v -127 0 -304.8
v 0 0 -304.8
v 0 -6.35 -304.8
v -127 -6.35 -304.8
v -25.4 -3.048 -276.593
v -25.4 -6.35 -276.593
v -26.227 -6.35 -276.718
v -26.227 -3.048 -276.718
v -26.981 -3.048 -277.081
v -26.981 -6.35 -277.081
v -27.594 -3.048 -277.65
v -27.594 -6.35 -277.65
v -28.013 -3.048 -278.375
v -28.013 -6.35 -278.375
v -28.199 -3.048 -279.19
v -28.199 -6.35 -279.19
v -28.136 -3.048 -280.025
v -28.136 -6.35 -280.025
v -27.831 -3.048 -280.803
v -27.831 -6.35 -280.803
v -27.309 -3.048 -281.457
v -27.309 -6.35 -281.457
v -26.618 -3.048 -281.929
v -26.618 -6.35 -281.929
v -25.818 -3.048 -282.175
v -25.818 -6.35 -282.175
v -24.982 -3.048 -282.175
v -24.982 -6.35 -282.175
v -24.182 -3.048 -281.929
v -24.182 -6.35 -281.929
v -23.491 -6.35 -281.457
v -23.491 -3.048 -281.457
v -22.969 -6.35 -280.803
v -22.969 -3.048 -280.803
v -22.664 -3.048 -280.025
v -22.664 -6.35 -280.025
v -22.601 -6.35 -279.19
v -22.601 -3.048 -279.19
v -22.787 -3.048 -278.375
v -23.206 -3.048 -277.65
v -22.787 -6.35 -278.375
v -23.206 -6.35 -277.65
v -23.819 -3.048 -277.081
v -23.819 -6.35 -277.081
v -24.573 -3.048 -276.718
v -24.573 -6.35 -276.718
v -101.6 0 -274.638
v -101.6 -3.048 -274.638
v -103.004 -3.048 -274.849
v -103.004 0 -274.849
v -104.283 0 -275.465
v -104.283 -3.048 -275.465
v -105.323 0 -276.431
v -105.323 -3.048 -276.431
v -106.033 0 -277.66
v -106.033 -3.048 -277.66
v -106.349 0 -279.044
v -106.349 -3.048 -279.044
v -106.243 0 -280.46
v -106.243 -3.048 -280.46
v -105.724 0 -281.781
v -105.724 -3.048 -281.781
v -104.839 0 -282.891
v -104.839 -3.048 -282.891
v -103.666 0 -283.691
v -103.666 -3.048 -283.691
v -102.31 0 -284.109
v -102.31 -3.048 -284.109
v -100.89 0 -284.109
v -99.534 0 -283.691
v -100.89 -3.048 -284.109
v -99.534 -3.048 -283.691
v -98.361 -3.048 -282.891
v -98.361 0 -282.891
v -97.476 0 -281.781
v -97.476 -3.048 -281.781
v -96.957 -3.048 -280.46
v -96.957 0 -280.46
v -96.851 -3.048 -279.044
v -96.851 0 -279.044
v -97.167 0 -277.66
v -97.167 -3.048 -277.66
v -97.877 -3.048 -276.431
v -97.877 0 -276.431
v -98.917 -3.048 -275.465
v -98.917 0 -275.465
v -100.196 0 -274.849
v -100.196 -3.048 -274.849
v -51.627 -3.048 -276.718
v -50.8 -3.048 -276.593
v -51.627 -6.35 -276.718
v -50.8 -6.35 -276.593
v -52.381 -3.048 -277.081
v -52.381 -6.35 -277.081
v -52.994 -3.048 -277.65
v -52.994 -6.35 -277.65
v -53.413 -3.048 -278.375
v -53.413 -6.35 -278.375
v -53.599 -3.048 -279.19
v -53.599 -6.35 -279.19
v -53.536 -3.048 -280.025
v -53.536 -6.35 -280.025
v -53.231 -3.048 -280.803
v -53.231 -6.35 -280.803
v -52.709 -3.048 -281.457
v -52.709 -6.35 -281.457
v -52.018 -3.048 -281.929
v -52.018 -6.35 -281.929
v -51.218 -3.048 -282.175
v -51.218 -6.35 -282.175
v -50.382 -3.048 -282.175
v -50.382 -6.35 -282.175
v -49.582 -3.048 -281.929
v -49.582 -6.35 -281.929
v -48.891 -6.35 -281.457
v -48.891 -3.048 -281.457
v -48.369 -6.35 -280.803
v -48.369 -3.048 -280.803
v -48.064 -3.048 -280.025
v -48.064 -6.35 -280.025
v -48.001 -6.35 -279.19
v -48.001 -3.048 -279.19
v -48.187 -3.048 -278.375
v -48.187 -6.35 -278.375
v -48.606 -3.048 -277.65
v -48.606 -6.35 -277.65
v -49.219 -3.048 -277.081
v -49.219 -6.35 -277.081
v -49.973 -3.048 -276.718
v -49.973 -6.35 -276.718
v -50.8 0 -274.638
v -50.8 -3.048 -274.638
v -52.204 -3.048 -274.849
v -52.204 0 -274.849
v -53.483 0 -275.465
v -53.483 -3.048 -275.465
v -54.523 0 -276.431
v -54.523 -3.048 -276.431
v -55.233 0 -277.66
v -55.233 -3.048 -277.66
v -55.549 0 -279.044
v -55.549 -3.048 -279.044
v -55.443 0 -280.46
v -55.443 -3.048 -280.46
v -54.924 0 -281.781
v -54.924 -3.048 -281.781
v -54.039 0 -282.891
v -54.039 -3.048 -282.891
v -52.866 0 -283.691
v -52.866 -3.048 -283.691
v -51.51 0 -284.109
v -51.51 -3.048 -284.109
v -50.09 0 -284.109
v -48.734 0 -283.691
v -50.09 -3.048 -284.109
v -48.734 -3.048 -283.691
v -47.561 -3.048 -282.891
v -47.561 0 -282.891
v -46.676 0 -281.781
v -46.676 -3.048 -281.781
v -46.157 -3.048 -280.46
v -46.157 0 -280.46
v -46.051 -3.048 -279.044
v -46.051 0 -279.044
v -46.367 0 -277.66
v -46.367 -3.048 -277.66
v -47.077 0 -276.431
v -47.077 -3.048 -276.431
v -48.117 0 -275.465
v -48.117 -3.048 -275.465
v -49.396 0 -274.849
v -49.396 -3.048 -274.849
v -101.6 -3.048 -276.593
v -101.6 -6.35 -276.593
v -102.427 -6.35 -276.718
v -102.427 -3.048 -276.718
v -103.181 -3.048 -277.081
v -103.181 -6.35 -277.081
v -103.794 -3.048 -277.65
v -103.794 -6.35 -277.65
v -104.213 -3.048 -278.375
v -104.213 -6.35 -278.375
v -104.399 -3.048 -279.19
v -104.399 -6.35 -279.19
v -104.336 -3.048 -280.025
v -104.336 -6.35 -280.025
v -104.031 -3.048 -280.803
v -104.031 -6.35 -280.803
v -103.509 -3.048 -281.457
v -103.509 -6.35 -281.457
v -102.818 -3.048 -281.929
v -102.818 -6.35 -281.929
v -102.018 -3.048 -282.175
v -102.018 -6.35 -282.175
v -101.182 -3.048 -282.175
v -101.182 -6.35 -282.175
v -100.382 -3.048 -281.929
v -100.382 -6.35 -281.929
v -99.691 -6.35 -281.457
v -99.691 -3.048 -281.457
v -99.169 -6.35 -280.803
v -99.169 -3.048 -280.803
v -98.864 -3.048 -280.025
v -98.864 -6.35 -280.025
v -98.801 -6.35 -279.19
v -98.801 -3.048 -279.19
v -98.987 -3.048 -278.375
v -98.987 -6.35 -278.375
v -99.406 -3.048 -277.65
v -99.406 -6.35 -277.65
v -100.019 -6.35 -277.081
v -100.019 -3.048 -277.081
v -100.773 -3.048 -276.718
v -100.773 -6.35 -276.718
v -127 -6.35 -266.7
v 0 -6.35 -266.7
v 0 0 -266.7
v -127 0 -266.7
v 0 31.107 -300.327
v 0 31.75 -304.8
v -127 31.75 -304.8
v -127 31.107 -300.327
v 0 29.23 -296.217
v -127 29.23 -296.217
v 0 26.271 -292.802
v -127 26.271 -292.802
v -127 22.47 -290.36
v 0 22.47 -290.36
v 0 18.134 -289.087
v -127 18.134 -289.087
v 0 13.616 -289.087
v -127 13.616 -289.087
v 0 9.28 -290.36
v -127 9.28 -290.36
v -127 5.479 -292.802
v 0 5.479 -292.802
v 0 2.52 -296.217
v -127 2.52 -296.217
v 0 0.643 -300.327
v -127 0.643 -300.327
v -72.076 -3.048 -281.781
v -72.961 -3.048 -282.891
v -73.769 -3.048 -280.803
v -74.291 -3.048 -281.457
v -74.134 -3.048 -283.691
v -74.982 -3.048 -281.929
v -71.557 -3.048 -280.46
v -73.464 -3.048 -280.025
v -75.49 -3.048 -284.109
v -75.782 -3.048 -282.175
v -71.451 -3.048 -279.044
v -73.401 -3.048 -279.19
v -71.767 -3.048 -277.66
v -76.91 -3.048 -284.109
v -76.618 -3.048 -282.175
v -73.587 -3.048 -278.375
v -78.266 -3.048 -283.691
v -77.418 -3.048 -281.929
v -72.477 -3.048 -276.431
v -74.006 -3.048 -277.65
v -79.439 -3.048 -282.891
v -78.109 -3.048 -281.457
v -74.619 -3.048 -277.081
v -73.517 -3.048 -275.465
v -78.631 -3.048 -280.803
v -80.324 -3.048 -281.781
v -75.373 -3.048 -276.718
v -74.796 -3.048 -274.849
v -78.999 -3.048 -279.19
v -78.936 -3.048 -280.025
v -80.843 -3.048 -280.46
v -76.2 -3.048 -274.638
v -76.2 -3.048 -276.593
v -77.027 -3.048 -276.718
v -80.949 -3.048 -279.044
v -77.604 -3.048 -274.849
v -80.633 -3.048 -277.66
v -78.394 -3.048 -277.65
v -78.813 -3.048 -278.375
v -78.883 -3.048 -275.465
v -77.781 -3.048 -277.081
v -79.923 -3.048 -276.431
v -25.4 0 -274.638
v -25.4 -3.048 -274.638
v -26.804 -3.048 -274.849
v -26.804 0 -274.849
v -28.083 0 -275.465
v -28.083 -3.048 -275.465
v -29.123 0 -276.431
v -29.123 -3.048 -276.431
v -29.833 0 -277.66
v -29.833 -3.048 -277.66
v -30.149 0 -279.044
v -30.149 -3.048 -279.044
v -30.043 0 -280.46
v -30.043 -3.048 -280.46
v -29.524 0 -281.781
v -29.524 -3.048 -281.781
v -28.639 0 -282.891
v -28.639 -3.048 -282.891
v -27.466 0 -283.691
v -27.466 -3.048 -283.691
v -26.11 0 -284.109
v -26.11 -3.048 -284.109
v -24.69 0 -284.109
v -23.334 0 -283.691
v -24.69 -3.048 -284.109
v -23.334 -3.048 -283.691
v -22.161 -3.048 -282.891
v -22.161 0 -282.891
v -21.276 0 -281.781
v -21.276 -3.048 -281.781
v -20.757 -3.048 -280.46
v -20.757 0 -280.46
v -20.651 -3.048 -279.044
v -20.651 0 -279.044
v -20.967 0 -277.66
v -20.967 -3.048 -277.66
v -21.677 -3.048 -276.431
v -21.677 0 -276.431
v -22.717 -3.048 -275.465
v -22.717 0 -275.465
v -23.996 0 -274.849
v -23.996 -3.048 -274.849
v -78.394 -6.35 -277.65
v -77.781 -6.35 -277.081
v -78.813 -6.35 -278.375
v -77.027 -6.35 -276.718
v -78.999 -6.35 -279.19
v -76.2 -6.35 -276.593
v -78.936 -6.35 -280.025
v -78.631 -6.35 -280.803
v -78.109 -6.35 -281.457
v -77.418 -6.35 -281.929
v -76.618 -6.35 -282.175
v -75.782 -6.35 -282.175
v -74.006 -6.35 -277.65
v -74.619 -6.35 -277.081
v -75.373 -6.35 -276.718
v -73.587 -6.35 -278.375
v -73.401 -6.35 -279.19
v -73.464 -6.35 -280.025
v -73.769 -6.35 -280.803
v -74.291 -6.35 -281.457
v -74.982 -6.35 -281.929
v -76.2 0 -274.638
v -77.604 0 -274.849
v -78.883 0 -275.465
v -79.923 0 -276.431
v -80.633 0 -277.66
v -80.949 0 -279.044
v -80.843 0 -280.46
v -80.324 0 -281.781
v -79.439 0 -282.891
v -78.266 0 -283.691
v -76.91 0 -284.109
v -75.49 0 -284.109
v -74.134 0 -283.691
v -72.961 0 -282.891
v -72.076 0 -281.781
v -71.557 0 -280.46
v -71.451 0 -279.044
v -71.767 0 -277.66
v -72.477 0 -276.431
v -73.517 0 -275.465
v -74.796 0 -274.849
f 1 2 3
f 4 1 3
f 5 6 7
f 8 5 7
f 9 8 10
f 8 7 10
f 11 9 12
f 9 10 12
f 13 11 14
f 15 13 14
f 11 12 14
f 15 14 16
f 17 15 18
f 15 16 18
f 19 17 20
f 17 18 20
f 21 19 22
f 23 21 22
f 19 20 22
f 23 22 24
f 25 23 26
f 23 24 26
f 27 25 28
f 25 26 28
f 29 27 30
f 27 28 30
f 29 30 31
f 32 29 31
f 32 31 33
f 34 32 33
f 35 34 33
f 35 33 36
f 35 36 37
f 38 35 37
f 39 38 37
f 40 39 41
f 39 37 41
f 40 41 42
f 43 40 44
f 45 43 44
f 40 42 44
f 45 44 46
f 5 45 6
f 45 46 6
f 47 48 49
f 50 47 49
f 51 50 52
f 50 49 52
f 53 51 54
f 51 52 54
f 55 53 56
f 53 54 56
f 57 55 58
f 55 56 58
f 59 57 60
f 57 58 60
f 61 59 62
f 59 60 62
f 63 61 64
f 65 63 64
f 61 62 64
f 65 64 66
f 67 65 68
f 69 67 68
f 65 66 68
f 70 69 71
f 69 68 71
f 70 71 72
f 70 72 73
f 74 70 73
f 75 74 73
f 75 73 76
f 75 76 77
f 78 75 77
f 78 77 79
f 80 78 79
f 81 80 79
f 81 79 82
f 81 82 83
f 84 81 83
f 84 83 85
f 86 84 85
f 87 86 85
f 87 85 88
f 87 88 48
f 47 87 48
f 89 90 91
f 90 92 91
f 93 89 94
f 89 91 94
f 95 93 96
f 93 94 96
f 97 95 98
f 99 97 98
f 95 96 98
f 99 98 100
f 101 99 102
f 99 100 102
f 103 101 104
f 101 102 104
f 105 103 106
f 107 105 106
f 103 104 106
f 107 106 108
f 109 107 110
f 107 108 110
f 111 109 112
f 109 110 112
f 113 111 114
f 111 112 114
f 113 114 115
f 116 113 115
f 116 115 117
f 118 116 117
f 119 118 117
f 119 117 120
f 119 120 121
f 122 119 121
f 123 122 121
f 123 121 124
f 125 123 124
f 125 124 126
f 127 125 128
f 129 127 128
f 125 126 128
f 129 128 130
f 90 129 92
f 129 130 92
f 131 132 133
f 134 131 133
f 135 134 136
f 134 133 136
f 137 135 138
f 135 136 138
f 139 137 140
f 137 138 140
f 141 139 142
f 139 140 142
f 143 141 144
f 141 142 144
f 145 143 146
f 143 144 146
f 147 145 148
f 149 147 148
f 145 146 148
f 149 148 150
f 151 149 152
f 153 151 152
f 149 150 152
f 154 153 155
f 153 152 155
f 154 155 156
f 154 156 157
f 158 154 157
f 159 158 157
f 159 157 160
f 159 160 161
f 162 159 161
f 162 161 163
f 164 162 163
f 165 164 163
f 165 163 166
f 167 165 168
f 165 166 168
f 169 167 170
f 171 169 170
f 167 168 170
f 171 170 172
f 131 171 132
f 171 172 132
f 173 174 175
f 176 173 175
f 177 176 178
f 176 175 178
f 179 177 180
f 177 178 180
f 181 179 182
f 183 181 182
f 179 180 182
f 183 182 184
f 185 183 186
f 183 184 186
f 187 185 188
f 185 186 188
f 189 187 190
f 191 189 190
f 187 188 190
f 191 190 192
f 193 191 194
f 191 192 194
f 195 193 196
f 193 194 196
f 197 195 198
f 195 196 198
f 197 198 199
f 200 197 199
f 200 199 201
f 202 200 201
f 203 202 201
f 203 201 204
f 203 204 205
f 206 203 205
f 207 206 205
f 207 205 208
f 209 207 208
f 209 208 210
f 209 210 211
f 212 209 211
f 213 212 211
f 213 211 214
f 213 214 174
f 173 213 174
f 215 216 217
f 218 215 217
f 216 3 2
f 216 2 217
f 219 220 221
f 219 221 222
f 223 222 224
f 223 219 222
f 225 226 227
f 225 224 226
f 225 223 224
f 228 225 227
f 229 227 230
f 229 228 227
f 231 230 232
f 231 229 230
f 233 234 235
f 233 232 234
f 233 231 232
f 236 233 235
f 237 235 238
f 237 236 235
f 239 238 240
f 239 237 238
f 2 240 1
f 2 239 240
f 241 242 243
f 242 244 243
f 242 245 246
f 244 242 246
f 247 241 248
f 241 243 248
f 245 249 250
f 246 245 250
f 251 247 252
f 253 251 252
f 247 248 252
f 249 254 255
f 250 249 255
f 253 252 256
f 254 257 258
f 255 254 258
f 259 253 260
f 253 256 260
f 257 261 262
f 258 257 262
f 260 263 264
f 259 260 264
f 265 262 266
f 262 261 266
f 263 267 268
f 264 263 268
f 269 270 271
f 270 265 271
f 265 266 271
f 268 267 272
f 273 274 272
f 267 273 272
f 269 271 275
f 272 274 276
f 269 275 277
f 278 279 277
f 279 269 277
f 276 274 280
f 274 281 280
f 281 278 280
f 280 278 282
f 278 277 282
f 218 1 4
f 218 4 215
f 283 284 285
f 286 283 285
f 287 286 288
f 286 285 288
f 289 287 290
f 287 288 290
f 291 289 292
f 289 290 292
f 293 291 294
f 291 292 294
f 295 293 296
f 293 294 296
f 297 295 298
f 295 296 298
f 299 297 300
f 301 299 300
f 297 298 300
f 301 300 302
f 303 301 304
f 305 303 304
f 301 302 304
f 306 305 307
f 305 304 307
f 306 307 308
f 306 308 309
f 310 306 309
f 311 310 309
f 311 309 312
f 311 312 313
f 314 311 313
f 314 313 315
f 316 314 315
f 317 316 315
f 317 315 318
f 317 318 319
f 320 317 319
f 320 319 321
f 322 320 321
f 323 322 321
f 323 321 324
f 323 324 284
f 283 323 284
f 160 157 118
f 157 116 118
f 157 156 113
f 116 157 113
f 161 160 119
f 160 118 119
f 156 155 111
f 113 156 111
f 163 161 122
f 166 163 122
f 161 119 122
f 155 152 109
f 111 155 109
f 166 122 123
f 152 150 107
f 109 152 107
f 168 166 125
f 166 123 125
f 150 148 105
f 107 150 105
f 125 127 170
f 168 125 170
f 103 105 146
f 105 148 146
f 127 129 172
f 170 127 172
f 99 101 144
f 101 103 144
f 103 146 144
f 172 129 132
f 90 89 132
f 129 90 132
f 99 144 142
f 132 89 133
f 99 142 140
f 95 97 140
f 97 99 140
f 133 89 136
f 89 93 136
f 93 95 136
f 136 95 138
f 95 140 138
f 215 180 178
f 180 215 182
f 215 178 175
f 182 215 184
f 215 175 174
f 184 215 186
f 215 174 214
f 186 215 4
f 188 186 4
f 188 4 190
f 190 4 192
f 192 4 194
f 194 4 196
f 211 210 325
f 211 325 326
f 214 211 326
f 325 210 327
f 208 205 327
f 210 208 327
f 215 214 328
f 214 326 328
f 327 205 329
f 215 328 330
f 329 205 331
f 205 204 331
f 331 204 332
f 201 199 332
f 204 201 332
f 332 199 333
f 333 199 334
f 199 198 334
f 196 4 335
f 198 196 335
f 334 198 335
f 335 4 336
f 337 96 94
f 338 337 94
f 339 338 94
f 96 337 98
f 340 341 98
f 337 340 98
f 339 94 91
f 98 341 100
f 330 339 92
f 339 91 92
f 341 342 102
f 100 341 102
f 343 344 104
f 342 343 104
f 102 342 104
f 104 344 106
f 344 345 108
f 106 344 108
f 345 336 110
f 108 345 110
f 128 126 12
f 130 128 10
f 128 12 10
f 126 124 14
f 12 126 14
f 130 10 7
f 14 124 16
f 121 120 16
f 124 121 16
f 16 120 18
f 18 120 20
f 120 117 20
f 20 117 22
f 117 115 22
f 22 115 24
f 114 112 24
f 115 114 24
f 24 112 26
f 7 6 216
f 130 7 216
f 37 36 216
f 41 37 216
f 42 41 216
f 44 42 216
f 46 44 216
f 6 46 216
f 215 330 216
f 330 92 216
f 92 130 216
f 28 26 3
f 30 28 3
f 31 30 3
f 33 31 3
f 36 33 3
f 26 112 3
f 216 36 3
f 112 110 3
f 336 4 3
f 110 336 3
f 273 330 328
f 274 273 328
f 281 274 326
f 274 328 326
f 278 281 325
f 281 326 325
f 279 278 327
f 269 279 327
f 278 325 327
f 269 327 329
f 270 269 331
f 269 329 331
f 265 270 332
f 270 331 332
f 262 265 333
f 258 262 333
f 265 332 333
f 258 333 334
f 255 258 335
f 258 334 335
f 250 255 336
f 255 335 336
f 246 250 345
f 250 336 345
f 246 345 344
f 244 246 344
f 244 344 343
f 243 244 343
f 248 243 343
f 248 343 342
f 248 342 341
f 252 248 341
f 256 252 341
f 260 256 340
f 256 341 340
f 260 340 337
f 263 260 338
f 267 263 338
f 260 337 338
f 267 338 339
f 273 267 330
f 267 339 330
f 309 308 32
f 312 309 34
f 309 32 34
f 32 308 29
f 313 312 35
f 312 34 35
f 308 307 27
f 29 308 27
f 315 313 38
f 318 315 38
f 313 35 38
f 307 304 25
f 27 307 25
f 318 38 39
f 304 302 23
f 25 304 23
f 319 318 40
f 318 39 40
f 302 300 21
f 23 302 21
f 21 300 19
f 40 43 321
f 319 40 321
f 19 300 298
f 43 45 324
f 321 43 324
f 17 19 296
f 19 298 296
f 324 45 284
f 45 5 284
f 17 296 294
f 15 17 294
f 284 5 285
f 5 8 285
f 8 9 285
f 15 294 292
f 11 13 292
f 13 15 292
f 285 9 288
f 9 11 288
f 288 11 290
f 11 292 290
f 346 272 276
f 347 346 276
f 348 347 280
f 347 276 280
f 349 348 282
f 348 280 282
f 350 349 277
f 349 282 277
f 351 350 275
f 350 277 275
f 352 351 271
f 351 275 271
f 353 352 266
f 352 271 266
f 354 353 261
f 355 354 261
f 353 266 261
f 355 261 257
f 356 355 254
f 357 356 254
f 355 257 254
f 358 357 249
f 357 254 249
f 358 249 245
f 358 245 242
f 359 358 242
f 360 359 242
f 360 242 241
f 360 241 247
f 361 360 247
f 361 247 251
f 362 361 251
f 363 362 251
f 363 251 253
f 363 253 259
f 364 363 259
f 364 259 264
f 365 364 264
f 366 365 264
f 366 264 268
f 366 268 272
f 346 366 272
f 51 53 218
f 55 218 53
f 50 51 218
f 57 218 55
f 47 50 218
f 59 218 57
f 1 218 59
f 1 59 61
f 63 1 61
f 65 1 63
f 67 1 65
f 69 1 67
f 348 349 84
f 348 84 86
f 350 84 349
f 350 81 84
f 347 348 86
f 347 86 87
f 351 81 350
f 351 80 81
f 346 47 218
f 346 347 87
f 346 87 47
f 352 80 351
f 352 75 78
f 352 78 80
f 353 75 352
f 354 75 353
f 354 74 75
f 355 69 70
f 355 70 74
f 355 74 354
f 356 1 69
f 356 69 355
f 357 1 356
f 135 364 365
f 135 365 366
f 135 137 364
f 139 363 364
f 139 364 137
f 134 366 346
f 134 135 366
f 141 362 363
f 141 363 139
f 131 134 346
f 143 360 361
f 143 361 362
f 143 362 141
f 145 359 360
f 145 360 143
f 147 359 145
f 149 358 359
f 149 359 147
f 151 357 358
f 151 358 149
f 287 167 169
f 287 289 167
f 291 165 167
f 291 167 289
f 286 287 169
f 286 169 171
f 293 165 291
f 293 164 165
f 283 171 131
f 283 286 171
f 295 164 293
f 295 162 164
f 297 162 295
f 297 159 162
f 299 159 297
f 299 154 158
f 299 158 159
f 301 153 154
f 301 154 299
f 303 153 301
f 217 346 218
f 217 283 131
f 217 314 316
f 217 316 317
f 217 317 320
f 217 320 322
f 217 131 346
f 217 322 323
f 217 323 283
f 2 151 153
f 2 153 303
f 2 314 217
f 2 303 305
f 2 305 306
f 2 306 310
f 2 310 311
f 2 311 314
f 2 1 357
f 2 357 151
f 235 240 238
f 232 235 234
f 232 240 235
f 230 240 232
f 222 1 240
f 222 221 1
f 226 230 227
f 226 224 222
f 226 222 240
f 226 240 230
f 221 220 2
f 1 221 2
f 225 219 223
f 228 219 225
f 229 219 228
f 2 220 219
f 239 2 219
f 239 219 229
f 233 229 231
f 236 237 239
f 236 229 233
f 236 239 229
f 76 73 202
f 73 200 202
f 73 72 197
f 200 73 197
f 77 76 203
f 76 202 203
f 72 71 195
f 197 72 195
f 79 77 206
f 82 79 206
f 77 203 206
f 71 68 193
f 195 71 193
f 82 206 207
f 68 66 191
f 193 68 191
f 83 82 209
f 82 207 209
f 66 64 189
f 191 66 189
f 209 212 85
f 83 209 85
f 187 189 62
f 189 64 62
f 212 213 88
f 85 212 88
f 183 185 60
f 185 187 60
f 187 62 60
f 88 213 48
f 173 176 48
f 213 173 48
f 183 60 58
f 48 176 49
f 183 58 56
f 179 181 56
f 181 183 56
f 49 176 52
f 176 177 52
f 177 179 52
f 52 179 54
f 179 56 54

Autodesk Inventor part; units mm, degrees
ref_plane "YZ Plane" through (0, 0, 0) normal (1, 0, 0) x (0, 1, 0)
ref_plane "XZ Plane" through (0, 0, 0) normal (0, 1, 0) x (-1, 0, 0)
sketch "Sketch2" plane through (0, 0, 0) normal (0, 0, 1) x (1, 0, 0)
  line L0 (304.8, 0) -> (304.8, 31.75)
  arc A0 (304.8, 31.75) -> (304.8, 0) centre (304.8, 15.875) ccw
  line L1 (304.8, 0) -> (266.7, 0)
  line L2 (266.7, 0) -> (266.7, -6.35)
  line L3 (266.7, -6.35) -> (304.8, -6.35)
  line L4 (304.8, -6.35) -> (304.8, 0)
  line L5 (0, 0) -> (304.8, 0) construction
  line L6 (0, -13.97) -> (0, 39.37) projected
  dimension "d0" = 31.75
  dimension "d1" = 304.8
  dimension "d2" = 6.35
  dimension "d8" = 15.875
  dimension "d9" = 38.1
revolve "Revolution1" add sketch "Sketch2" angle 90 about axis through (0, -10, 0) along (0, 1, 0)
ref_plane "Work Plane1" through (0, -6.35, -304.8) normal (-1, 0, 0) x (0, 0, 1)
sketch "Sketch3" plane through (0, -6.35, -266.7) normal (-1, 0, 0) x (0, 0, 1)
  arc A0 (-38.1, 6.35) -> (-38.1, 38.1) centre (-38.1, 22.225) ccw projected
  line L0 (-38.1, 38.1) -> (-38.1, 6.35) projected
  line L1 (-38.1, 6.35) -> (-38.1, 38.1)
  line L2 (-38.1, 0) -> (0, 0) projected
  line L3 (-38.1, 6.35) -> (-38.1, 0)
  line L4 (-38.1, 0) -> (0, 0)
  line L5 (0, 6.35) -> (-38.1, 6.35)
  arc A1 (-38.1, 6.35) -> (-38.1, 38.1) centre (-38.1, 22.225) ccw
  line L6 (266.7, 6.35) -> (0, 6.35) projected
  line L7 (0, 0) -> (0, 6.35) projected
  line L8 (0, 6.35) -> (0, 0)
extrude "Extrusion2" add sketch "Sketch3" along normal blind 127
split "Split1" plane through (0, -6.35, -304.8) removes the side toward (1, 0, 0)
sketch "Sketch4" plane through (-127, 0, -266.7) normal (0, 1, 0) x (1, 0, 0)
  line L0 (127, 0) -> (127, 38.1) projected
  line L1 (152.4, -266.7) -> (-25.4, -266.7) projected
  point P0 (127, -266.7)
  point P1 (101.6, 12.7)
  dimension "d10" = 25.4
  dimension "d11" = 279.4
hole "Hole1" at (-25.4, 0, -279.4) direction (0, -1, 0) diameter 5.6134 end through all counterbore diameter 9.525 counterbore depth 3.048 clearance for "Hex Machine Screw" size "#10" standard "Ansi Unified Screw Threads"
pattern_linear "Rectangular Pattern1" count 4 spacing 25.4 along (-1, 0, 0) of "Hole1"
equation "\"d1\" = outerRadius"
equation "\"d8\" = spacerRadius"
equation "\"wheelDiameter\" = 184.15"
equation "\"frisbeeDiameter\" = 228.6"
equation "\"outerRadius\" = 304.8"
equation "\"wheelRadius\" = 0.5 * wheelDiameter"
equation "\"spacerRadius\" = 15.875"
properties part number "Whack01-RunnerForFrisbeeShooterExtension"
